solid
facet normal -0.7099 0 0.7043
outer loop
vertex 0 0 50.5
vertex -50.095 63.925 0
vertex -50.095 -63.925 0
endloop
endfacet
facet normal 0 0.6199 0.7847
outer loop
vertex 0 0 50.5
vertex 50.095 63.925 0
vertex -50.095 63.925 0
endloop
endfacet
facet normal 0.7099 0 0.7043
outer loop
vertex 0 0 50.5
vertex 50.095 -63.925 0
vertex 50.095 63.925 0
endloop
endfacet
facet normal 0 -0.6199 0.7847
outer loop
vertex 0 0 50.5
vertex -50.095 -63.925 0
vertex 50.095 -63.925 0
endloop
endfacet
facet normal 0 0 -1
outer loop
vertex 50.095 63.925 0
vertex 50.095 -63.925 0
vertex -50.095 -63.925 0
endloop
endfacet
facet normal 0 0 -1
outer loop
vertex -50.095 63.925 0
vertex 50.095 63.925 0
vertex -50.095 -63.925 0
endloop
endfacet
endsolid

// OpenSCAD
//resolution
$fn = 150;

//dimensions, in mm


y=127.85;
x=100.19;
z=50.5;

pyramid(x, y, z);

//pyramid making module bottom centered at origin
module pyramid(x_length, y_lenght, z_lenght){

	#translate([-x_length/2,-y_lenght/2,0]) 

		polyhedron(

		points = [[0,0,0], [0,y_lenght,0], [x_length,y_lenght,0], [x_length,0,0], [x_length/2,y_lenght/2,z_lenght]], 

		triangles = [[0,1,4],[1,2,4],[2,3,4],[3,0,4],[0,3,2],[0,2,1]]);

};
